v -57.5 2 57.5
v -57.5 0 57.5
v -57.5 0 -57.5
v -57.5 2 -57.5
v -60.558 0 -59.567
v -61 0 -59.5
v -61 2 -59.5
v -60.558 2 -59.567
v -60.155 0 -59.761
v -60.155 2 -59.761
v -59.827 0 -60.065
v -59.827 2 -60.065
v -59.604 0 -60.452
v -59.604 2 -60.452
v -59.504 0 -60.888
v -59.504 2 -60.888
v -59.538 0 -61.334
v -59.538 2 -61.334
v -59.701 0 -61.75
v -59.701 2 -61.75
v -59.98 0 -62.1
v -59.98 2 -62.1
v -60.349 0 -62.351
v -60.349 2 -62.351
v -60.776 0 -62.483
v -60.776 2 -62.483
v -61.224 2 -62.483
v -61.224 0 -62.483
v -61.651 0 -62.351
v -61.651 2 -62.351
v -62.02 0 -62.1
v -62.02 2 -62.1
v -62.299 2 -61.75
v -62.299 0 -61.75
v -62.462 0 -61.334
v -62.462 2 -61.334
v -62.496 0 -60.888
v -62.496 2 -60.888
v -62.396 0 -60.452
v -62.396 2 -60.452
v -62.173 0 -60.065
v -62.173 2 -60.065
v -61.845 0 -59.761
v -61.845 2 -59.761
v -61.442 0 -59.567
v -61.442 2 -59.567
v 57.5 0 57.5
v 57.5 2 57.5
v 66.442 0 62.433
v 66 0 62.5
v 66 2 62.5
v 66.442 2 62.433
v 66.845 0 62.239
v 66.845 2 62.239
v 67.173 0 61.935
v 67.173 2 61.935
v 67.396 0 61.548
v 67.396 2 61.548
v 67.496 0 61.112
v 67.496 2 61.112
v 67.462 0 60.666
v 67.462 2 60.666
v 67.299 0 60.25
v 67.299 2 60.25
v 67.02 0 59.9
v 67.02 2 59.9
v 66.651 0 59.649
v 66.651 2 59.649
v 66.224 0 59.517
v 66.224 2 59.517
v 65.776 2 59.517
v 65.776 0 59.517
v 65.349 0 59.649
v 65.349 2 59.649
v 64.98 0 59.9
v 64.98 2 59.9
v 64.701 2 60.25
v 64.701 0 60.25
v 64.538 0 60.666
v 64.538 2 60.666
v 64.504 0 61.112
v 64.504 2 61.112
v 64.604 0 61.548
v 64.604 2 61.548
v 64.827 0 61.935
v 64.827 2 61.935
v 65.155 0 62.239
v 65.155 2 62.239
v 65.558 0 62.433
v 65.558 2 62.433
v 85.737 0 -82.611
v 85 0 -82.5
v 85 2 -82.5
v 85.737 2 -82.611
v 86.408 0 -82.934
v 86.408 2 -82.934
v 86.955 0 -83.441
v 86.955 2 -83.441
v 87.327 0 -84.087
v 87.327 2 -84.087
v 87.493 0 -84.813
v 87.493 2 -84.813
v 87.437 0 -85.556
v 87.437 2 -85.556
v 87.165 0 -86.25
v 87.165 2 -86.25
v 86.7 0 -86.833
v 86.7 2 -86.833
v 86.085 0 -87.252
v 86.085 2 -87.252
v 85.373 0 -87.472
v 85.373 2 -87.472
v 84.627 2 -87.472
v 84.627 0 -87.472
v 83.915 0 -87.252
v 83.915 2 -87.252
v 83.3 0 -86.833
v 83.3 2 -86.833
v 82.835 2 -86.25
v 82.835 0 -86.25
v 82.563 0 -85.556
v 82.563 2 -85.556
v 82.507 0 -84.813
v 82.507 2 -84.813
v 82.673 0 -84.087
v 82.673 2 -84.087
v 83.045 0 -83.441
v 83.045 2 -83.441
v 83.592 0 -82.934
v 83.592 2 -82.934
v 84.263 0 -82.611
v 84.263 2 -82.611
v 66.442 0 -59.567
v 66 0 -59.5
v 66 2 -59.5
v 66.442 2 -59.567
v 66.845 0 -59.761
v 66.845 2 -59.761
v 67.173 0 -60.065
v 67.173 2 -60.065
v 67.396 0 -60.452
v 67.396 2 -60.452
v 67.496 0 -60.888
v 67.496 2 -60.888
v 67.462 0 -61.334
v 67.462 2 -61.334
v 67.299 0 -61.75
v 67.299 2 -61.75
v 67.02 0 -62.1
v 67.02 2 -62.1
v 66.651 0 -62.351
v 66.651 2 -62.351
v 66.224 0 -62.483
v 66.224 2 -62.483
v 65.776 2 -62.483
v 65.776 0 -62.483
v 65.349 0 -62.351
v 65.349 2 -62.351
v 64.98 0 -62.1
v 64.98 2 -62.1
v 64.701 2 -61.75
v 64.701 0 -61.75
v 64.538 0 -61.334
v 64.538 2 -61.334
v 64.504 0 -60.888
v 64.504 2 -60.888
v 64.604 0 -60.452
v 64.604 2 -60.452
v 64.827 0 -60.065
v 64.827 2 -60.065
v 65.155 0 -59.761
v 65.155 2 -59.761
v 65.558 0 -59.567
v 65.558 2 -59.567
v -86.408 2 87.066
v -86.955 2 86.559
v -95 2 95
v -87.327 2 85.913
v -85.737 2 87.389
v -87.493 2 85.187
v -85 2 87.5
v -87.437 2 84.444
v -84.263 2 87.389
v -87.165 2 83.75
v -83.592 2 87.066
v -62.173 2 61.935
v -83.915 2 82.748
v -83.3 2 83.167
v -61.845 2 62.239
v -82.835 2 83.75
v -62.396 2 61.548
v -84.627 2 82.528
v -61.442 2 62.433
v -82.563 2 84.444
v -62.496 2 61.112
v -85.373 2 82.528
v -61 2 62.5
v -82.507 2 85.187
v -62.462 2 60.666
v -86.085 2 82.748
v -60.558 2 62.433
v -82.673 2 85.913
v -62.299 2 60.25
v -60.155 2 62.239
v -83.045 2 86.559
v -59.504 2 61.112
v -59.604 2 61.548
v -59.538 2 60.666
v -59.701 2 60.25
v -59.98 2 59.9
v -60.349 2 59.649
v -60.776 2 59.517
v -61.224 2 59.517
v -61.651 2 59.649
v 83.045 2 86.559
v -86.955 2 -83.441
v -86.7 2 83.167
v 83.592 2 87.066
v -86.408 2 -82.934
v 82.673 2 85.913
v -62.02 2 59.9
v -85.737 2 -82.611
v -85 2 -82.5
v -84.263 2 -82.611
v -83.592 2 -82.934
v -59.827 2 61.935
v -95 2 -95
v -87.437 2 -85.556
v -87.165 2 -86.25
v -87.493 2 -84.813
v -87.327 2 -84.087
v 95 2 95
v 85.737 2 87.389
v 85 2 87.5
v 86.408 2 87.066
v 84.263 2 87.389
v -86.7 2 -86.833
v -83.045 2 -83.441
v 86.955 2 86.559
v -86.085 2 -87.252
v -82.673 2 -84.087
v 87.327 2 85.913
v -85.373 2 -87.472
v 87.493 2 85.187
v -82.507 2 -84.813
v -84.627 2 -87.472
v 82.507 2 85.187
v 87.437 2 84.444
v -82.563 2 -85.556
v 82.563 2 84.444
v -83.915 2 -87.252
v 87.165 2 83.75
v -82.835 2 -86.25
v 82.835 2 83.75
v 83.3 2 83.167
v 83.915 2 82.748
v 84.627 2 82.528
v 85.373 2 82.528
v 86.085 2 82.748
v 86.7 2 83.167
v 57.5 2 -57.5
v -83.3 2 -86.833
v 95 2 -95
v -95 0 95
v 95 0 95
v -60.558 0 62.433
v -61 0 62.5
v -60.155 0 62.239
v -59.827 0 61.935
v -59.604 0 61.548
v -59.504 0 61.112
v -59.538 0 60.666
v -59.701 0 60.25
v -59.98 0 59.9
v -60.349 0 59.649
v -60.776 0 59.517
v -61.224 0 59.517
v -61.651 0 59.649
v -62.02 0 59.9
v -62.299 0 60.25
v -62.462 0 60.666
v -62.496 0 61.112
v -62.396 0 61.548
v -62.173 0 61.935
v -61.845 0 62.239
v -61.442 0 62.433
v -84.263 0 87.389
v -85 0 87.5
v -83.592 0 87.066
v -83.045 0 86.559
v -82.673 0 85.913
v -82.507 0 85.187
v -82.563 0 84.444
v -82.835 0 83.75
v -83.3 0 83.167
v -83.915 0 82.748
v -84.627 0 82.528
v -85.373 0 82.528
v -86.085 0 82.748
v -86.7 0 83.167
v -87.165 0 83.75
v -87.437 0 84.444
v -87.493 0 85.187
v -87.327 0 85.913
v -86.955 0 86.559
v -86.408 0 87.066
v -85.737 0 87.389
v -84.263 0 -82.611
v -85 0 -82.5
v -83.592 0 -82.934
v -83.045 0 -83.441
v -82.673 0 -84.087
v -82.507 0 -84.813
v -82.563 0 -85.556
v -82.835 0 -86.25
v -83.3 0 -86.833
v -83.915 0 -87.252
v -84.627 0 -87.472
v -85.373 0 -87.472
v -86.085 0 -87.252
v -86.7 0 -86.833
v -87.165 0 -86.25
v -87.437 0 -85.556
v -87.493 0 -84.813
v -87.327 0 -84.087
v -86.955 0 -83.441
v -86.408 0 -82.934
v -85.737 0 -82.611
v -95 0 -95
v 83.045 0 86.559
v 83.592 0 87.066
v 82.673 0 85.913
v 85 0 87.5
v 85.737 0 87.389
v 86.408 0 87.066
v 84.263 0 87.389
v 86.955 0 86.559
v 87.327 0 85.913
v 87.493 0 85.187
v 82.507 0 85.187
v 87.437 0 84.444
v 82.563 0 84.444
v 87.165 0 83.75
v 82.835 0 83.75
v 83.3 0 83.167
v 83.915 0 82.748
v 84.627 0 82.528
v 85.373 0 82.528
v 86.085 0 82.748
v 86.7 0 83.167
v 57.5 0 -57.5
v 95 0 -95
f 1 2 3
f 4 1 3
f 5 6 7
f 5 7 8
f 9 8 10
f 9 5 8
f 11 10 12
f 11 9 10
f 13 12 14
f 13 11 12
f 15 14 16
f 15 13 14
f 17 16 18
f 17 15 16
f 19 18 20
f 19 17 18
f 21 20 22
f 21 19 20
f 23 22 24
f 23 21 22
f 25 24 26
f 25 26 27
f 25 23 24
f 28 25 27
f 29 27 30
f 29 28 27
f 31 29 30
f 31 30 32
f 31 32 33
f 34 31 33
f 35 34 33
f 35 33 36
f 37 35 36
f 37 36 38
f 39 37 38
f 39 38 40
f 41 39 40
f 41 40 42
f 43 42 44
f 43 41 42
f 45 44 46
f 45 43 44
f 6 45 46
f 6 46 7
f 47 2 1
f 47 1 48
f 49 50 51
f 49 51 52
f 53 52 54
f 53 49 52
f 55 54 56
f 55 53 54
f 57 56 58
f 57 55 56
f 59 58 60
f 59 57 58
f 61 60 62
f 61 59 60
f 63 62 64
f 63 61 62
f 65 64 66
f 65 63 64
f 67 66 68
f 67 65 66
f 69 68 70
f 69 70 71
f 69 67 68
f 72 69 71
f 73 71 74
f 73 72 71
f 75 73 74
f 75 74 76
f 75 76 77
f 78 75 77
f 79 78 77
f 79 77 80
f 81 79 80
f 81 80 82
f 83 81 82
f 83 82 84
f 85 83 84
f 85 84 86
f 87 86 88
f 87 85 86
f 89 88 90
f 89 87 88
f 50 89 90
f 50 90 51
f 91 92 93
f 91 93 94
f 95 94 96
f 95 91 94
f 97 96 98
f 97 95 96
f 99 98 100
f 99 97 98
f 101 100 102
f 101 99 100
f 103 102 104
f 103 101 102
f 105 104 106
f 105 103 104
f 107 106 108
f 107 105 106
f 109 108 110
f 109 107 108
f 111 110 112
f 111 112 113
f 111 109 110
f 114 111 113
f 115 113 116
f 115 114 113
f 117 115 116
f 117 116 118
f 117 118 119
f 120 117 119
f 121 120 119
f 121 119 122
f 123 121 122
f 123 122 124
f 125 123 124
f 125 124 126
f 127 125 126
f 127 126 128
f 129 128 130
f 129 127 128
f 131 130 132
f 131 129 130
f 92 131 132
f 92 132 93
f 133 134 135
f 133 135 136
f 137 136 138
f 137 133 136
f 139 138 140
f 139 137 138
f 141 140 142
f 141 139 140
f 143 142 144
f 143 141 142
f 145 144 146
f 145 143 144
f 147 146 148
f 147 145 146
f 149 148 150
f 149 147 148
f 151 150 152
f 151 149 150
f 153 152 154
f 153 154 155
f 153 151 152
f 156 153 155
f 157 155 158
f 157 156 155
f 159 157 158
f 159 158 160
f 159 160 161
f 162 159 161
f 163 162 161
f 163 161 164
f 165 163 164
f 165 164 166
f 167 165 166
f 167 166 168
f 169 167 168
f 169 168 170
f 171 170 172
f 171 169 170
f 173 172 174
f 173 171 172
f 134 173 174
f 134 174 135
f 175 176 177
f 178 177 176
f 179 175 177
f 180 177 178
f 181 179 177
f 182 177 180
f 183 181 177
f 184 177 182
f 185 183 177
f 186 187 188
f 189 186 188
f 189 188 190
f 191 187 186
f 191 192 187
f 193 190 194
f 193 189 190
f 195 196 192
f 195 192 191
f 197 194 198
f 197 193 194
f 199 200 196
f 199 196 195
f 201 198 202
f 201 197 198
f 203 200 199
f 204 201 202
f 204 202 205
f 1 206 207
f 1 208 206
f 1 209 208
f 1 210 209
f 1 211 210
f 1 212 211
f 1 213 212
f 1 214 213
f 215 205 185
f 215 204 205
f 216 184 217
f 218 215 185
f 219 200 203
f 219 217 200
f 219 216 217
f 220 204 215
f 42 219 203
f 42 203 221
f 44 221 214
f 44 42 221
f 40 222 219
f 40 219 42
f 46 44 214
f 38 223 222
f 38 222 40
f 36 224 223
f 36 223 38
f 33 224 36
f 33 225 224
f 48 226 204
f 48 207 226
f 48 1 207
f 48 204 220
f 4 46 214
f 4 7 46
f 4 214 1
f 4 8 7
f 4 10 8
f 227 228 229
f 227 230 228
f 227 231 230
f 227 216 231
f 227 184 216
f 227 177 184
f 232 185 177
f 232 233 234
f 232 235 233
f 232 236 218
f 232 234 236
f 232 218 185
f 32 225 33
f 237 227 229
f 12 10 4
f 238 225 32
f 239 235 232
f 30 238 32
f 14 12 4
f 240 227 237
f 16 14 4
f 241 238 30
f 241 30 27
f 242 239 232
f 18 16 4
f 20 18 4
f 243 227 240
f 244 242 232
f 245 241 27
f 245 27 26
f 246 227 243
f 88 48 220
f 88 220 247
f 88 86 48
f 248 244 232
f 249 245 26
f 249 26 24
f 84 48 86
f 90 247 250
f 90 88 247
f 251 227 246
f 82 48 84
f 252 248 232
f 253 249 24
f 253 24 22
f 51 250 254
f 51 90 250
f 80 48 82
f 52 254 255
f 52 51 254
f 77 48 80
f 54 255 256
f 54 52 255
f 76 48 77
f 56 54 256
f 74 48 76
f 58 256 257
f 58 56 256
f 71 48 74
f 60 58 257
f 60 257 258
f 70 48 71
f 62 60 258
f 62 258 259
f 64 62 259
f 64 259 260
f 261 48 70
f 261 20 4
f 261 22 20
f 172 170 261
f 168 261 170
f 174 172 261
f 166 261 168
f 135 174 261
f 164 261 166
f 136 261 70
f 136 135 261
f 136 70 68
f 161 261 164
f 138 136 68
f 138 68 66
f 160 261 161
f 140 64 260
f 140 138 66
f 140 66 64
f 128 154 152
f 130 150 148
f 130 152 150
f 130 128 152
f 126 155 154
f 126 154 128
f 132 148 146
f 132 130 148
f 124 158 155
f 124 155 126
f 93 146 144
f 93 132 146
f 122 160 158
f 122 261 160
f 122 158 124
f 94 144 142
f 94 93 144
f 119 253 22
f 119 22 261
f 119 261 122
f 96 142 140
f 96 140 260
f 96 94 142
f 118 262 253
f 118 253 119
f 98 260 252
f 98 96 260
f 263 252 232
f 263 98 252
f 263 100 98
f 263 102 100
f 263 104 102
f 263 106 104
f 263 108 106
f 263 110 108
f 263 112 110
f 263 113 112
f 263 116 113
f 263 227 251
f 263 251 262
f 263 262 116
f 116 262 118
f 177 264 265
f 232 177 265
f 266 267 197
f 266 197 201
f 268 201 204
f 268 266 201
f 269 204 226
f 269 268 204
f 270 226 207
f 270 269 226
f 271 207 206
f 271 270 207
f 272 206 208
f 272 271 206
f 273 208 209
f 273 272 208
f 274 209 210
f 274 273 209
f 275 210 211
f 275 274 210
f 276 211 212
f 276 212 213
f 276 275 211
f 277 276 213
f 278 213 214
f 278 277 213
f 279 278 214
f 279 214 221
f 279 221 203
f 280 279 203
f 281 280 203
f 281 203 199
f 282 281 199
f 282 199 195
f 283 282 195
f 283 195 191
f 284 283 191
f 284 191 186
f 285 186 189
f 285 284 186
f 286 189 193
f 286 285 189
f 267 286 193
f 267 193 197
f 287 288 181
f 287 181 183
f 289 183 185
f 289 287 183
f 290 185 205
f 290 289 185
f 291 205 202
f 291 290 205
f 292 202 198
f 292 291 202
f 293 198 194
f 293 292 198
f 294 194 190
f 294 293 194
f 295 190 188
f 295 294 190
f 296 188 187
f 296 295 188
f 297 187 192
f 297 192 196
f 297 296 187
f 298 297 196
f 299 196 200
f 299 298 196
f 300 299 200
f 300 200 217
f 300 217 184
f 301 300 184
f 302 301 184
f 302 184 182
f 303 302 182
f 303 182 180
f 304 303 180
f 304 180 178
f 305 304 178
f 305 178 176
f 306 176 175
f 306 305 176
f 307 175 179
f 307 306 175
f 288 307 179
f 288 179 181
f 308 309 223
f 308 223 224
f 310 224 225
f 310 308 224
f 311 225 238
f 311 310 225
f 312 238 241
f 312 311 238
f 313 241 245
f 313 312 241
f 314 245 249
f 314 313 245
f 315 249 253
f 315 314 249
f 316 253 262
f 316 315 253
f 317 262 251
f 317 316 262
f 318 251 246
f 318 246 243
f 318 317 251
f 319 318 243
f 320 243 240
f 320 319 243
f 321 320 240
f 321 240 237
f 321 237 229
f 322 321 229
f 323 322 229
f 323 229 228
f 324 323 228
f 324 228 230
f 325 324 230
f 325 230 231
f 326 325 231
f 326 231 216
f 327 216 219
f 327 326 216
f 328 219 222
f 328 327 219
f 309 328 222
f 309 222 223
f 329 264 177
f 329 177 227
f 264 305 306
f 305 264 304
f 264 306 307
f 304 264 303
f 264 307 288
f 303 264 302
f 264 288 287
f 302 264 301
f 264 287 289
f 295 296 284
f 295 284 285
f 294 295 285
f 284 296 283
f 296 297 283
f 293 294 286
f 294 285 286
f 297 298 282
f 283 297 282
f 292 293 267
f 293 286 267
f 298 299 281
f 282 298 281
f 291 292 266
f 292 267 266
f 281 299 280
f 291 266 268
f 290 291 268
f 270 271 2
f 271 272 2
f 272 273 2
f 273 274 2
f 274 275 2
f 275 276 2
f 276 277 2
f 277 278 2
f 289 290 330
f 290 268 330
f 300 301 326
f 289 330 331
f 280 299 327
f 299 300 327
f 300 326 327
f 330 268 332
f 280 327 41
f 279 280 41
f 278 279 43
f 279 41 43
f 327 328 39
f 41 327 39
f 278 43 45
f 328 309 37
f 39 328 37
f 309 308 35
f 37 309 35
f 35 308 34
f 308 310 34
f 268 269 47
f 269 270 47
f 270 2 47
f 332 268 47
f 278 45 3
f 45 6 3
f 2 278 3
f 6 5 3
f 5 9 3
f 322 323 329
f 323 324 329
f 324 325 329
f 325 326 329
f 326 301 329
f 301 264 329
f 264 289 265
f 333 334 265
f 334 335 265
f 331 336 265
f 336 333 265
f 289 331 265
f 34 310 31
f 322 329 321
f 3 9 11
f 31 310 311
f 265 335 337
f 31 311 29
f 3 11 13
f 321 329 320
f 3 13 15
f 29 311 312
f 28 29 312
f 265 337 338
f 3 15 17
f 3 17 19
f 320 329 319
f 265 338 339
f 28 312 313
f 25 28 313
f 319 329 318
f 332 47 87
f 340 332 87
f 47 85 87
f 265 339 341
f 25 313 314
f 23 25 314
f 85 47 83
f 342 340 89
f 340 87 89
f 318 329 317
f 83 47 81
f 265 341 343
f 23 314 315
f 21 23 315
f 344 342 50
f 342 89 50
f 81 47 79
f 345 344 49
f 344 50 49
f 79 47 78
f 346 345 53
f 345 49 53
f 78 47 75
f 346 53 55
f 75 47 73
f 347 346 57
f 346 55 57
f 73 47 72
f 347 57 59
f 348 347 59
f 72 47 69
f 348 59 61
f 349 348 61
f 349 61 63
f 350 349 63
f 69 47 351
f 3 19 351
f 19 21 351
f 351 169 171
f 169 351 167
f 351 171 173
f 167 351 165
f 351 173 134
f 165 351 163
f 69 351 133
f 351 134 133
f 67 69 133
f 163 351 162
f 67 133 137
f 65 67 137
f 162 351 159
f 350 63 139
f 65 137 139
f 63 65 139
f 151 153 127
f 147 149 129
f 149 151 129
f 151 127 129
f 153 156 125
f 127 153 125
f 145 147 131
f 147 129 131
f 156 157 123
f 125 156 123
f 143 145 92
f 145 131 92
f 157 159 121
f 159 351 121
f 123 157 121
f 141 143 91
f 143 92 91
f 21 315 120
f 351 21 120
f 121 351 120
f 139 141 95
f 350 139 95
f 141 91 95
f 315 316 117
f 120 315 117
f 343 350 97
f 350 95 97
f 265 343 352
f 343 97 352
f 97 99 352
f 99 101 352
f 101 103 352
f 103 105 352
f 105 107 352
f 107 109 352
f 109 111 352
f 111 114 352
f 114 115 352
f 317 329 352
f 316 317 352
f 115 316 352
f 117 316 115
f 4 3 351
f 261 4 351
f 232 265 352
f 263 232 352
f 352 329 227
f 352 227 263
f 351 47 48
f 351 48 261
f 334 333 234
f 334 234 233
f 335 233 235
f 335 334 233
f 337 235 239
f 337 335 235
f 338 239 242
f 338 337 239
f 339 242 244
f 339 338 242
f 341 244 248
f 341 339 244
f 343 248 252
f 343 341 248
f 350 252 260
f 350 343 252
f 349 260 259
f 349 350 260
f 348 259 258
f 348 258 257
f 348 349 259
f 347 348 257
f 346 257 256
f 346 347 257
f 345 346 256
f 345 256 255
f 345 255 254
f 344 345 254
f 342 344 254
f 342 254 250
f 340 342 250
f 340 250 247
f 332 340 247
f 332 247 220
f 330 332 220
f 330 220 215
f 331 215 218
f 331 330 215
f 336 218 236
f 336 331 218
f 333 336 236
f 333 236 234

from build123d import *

# Parameters (mm, degrees)
CROQUIS1_W              = 190
CROQUIS1_H              = 190
CROQUIS1_R              = 2.5
CROQUIS1_R_2            = 1.5
CROQUIS1_W_2            = 115
CROQUIS1_H_2            = 115
SALIENTE_EXTRUIR1_DEPTH = 2


with BuildPart() as part:
    # Croquis1 → Saliente-Extruir1 (new body)
    with BuildSketch(Plane(origin=(0, 0, 0), x_dir=(1, 0, 0), z_dir=(0, 1, 0))):
        Rectangle(CROQUIS1_W, CROQUIS1_H)
        with Locations(Location((-85, 85, 0), (0, 0, 270))):
            Circle(CROQUIS1_R, mode=Mode.SUBTRACT)
        with Locations(Location((85, 85, 0), (0, 0, 270))):
            Circle(CROQUIS1_R, mode=Mode.SUBTRACT)
        with Locations(Location((85, -85, 0), (0, 0, 270))):
            Circle(CROQUIS1_R, mode=Mode.SUBTRACT)
        with Locations(Location((-85, -85, 0), (0, 0, 270))):
            Circle(CROQUIS1_R, mode=Mode.SUBTRACT)
        with Locations(Location((-61, 61, 0), (0, 0, 270))):
            Circle(CROQUIS1_R_2, mode=Mode.SUBTRACT)
        with Locations(Location((66, 61, 0), (0, 0, 270))):
            Circle(CROQUIS1_R_2, mode=Mode.SUBTRACT)
        with Locations(Location((66, -61, 0), (0, 0, 270))):
            Circle(CROQUIS1_R_2, mode=Mode.SUBTRACT)
        with Locations(Location((-61, -61, 0), (0, 0, 270))):
            Circle(CROQUIS1_R_2, mode=Mode.SUBTRACT)
        Rectangle(CROQUIS1_W_2, CROQUIS1_H_2, mode=Mode.SUBTRACT)
    extrude(amount=SALIENTE_EXTRUIR1_DEPTH)


solid = part.part
